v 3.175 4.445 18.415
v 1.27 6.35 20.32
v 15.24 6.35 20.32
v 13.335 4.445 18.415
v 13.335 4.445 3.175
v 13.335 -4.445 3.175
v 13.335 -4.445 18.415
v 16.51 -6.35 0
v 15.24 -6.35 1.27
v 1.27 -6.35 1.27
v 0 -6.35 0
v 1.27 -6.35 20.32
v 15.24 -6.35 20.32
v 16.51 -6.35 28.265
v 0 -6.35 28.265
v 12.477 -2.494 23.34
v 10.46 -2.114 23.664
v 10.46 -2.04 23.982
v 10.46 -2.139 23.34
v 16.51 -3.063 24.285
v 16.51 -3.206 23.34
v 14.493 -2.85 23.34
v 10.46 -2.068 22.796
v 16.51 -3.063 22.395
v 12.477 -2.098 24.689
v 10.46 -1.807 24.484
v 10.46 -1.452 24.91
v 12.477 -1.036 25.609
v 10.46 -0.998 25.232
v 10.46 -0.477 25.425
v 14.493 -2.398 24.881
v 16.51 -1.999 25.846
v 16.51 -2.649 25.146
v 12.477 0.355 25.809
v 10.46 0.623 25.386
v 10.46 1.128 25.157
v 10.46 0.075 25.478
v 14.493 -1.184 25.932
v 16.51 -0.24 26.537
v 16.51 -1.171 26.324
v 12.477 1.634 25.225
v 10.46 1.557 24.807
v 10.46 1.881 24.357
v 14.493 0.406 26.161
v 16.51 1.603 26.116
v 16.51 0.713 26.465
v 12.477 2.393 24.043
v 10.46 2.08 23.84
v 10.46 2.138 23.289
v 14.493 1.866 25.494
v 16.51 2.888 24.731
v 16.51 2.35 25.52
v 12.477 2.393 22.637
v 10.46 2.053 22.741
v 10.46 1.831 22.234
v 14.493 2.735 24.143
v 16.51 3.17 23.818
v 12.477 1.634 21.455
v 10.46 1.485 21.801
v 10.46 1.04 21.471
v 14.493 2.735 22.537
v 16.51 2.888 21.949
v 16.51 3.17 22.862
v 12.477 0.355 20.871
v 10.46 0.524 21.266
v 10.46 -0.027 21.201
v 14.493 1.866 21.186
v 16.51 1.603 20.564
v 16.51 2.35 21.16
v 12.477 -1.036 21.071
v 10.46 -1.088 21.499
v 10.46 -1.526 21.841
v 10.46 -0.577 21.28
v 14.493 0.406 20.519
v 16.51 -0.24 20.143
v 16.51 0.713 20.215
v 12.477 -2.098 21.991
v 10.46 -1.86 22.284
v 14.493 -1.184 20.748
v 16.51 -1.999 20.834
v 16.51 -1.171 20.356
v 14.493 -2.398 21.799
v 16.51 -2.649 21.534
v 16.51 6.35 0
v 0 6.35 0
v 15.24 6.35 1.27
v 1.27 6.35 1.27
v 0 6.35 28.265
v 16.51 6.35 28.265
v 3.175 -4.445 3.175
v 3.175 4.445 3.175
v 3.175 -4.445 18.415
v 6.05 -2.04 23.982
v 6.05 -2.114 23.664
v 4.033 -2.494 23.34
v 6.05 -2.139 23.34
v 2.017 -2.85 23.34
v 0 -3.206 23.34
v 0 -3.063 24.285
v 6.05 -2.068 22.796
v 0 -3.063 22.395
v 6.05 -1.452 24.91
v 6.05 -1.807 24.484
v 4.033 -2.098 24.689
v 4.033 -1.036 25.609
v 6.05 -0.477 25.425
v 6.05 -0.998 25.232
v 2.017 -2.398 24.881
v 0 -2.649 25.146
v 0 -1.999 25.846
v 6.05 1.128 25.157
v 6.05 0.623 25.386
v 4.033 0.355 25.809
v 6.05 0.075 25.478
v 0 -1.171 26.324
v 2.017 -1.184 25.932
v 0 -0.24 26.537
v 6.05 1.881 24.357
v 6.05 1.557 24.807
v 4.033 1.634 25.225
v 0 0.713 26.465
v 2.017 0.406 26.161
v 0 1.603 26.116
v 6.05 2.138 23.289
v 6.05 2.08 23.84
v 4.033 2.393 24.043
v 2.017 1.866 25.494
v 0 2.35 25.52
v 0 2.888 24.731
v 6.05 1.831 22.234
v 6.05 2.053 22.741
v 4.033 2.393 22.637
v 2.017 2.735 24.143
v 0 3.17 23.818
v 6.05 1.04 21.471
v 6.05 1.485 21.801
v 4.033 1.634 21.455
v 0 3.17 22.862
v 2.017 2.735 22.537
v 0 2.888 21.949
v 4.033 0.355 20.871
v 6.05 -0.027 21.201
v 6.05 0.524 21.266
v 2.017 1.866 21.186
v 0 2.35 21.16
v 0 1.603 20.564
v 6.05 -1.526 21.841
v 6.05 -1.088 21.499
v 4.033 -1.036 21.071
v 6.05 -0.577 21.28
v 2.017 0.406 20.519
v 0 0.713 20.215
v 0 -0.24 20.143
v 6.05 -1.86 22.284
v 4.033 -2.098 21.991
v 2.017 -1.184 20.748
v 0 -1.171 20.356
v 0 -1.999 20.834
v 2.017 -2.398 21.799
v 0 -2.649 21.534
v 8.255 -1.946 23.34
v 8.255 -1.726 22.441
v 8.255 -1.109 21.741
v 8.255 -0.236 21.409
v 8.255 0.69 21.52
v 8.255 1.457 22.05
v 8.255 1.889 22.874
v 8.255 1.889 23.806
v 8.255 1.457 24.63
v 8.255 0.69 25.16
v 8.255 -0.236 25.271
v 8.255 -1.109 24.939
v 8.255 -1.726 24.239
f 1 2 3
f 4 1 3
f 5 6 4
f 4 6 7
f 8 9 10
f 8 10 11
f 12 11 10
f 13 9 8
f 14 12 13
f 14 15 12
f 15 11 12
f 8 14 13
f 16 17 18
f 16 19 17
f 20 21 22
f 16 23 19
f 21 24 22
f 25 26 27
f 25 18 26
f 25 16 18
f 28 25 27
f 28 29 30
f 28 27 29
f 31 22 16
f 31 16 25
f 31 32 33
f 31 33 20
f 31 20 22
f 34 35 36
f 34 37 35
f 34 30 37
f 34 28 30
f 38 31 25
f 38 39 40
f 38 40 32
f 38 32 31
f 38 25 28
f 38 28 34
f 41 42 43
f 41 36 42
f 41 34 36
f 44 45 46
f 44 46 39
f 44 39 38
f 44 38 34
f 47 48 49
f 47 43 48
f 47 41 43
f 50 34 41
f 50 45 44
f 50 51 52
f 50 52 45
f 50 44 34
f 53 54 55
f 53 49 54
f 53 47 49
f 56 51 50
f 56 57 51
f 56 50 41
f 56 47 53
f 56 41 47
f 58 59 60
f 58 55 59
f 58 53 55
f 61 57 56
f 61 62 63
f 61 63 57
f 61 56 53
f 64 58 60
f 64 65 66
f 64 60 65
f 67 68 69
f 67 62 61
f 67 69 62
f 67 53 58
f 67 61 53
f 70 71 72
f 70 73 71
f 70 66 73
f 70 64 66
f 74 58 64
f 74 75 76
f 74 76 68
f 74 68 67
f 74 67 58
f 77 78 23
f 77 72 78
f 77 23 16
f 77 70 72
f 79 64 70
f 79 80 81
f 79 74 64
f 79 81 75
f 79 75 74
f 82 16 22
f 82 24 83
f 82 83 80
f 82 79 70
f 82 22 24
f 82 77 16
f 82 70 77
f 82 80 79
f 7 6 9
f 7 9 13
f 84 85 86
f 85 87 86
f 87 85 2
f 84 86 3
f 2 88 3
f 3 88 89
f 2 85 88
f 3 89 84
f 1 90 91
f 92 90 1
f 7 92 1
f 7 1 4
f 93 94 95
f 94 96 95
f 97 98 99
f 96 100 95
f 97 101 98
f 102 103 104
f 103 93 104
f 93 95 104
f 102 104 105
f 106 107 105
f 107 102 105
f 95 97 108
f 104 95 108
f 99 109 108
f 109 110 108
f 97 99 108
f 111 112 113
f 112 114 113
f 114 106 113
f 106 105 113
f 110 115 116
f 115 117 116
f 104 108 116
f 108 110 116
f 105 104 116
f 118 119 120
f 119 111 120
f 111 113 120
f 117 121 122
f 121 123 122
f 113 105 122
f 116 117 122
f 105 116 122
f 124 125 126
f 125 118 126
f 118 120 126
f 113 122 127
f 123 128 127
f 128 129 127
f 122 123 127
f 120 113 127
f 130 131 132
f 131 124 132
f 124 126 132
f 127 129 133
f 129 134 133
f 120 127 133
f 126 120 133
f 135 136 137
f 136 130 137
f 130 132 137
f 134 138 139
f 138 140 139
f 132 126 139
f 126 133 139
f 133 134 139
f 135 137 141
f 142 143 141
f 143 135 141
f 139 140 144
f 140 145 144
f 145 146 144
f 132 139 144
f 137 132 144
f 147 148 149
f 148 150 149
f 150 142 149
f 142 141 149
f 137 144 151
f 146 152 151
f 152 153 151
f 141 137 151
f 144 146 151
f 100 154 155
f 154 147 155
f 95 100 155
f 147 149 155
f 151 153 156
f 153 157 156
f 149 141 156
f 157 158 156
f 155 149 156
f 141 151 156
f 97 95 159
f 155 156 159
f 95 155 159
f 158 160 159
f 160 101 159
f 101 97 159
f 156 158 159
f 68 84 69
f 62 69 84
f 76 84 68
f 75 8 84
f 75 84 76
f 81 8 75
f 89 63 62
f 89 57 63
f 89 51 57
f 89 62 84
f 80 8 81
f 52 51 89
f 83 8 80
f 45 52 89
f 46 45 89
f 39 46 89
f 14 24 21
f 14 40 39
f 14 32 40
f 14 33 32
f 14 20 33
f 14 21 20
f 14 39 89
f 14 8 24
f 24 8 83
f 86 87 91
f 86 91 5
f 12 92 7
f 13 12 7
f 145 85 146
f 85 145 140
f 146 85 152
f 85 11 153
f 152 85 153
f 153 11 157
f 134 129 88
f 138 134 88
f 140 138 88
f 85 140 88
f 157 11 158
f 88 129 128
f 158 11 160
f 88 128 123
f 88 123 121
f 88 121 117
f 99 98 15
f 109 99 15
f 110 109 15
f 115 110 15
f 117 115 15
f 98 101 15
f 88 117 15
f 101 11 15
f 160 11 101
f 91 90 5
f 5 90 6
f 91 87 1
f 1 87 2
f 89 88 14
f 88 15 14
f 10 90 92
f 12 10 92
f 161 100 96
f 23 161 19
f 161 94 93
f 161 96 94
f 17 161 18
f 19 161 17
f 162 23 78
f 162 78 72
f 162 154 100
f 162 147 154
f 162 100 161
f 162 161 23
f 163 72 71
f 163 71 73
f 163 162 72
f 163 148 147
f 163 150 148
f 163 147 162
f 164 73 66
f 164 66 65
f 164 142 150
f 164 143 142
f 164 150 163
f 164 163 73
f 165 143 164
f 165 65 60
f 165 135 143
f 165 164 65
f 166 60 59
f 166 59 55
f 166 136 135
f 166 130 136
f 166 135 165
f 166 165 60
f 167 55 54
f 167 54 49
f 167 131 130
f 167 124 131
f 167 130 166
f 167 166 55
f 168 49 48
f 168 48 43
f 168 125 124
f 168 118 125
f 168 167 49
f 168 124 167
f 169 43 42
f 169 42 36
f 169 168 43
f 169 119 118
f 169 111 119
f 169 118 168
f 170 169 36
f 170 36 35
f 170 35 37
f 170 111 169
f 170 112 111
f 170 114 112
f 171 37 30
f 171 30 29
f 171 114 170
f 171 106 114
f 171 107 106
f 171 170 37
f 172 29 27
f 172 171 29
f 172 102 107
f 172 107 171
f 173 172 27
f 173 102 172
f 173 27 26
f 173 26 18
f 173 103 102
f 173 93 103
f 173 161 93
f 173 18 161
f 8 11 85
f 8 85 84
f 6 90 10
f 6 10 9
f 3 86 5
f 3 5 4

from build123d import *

# Parameters (mm, degrees)
F0_W     = 16.51
F0_H     = 28.265
F0_W_2   = 10.16
F0_H_2   = 15.24
F1_DEPTH = 6.35
F2_SIZE  = 1.905
F4_R     = 1.75
F5_DEPTH = 12.7
F5_TAPER = -10
F6_R     = 12.7


with BuildPart() as f1:
    # F0 (on Front) → F1 (new body, symmetric)
    with BuildSketch(Plane.XZ):
        with Locations((8.255, 14.1325)):
            Rectangle(F0_W, F0_H)
        with Locations((8.255, 10.795)):
            Rectangle(F0_W_2, F0_H_2, mode=Mode.SUBTRACT)
    extrude(amount=F1_DEPTH, both=True)

    # F2
    f2_edges = [f1.edges().sort_by_distance(p)[0] for p in [
        (13.335, -6.35, 10.795),
        (8.255, -6.35, 18.415),
        (3.175, -6.35, 10.795),
        (8.255, -6.35, 3.175),
        (3.175, 6.35, 10.795),
        (8.255, 6.35, 18.415),
        (8.255, 6.35, 3.175),
        (13.335, 6.35, 10.795),
    ]]
    chamfer(f2_edges, length=F2_SIZE)

    # F4 (on mid) → F5 (cut, symmetric)
    with BuildSketch(Plane(origin=(8.255, 0, 0), x_dir=(0, -1, 0), z_dir=(-1, 0, 0))):
        with Locations((0, 23.34)):
            Circle(F4_R)
    extrude(amount=F5_DEPTH, both=True, taper=F5_TAPER, mode=Mode.SUBTRACT)

    # F6
    f6_edges = [f1.edges().sort_by_distance(p)[0] for p in [
        (8.255, 1.75, 23.34),
    ]]
    fillet(f6_edges, radius=F6_R)


solid = f1.part
